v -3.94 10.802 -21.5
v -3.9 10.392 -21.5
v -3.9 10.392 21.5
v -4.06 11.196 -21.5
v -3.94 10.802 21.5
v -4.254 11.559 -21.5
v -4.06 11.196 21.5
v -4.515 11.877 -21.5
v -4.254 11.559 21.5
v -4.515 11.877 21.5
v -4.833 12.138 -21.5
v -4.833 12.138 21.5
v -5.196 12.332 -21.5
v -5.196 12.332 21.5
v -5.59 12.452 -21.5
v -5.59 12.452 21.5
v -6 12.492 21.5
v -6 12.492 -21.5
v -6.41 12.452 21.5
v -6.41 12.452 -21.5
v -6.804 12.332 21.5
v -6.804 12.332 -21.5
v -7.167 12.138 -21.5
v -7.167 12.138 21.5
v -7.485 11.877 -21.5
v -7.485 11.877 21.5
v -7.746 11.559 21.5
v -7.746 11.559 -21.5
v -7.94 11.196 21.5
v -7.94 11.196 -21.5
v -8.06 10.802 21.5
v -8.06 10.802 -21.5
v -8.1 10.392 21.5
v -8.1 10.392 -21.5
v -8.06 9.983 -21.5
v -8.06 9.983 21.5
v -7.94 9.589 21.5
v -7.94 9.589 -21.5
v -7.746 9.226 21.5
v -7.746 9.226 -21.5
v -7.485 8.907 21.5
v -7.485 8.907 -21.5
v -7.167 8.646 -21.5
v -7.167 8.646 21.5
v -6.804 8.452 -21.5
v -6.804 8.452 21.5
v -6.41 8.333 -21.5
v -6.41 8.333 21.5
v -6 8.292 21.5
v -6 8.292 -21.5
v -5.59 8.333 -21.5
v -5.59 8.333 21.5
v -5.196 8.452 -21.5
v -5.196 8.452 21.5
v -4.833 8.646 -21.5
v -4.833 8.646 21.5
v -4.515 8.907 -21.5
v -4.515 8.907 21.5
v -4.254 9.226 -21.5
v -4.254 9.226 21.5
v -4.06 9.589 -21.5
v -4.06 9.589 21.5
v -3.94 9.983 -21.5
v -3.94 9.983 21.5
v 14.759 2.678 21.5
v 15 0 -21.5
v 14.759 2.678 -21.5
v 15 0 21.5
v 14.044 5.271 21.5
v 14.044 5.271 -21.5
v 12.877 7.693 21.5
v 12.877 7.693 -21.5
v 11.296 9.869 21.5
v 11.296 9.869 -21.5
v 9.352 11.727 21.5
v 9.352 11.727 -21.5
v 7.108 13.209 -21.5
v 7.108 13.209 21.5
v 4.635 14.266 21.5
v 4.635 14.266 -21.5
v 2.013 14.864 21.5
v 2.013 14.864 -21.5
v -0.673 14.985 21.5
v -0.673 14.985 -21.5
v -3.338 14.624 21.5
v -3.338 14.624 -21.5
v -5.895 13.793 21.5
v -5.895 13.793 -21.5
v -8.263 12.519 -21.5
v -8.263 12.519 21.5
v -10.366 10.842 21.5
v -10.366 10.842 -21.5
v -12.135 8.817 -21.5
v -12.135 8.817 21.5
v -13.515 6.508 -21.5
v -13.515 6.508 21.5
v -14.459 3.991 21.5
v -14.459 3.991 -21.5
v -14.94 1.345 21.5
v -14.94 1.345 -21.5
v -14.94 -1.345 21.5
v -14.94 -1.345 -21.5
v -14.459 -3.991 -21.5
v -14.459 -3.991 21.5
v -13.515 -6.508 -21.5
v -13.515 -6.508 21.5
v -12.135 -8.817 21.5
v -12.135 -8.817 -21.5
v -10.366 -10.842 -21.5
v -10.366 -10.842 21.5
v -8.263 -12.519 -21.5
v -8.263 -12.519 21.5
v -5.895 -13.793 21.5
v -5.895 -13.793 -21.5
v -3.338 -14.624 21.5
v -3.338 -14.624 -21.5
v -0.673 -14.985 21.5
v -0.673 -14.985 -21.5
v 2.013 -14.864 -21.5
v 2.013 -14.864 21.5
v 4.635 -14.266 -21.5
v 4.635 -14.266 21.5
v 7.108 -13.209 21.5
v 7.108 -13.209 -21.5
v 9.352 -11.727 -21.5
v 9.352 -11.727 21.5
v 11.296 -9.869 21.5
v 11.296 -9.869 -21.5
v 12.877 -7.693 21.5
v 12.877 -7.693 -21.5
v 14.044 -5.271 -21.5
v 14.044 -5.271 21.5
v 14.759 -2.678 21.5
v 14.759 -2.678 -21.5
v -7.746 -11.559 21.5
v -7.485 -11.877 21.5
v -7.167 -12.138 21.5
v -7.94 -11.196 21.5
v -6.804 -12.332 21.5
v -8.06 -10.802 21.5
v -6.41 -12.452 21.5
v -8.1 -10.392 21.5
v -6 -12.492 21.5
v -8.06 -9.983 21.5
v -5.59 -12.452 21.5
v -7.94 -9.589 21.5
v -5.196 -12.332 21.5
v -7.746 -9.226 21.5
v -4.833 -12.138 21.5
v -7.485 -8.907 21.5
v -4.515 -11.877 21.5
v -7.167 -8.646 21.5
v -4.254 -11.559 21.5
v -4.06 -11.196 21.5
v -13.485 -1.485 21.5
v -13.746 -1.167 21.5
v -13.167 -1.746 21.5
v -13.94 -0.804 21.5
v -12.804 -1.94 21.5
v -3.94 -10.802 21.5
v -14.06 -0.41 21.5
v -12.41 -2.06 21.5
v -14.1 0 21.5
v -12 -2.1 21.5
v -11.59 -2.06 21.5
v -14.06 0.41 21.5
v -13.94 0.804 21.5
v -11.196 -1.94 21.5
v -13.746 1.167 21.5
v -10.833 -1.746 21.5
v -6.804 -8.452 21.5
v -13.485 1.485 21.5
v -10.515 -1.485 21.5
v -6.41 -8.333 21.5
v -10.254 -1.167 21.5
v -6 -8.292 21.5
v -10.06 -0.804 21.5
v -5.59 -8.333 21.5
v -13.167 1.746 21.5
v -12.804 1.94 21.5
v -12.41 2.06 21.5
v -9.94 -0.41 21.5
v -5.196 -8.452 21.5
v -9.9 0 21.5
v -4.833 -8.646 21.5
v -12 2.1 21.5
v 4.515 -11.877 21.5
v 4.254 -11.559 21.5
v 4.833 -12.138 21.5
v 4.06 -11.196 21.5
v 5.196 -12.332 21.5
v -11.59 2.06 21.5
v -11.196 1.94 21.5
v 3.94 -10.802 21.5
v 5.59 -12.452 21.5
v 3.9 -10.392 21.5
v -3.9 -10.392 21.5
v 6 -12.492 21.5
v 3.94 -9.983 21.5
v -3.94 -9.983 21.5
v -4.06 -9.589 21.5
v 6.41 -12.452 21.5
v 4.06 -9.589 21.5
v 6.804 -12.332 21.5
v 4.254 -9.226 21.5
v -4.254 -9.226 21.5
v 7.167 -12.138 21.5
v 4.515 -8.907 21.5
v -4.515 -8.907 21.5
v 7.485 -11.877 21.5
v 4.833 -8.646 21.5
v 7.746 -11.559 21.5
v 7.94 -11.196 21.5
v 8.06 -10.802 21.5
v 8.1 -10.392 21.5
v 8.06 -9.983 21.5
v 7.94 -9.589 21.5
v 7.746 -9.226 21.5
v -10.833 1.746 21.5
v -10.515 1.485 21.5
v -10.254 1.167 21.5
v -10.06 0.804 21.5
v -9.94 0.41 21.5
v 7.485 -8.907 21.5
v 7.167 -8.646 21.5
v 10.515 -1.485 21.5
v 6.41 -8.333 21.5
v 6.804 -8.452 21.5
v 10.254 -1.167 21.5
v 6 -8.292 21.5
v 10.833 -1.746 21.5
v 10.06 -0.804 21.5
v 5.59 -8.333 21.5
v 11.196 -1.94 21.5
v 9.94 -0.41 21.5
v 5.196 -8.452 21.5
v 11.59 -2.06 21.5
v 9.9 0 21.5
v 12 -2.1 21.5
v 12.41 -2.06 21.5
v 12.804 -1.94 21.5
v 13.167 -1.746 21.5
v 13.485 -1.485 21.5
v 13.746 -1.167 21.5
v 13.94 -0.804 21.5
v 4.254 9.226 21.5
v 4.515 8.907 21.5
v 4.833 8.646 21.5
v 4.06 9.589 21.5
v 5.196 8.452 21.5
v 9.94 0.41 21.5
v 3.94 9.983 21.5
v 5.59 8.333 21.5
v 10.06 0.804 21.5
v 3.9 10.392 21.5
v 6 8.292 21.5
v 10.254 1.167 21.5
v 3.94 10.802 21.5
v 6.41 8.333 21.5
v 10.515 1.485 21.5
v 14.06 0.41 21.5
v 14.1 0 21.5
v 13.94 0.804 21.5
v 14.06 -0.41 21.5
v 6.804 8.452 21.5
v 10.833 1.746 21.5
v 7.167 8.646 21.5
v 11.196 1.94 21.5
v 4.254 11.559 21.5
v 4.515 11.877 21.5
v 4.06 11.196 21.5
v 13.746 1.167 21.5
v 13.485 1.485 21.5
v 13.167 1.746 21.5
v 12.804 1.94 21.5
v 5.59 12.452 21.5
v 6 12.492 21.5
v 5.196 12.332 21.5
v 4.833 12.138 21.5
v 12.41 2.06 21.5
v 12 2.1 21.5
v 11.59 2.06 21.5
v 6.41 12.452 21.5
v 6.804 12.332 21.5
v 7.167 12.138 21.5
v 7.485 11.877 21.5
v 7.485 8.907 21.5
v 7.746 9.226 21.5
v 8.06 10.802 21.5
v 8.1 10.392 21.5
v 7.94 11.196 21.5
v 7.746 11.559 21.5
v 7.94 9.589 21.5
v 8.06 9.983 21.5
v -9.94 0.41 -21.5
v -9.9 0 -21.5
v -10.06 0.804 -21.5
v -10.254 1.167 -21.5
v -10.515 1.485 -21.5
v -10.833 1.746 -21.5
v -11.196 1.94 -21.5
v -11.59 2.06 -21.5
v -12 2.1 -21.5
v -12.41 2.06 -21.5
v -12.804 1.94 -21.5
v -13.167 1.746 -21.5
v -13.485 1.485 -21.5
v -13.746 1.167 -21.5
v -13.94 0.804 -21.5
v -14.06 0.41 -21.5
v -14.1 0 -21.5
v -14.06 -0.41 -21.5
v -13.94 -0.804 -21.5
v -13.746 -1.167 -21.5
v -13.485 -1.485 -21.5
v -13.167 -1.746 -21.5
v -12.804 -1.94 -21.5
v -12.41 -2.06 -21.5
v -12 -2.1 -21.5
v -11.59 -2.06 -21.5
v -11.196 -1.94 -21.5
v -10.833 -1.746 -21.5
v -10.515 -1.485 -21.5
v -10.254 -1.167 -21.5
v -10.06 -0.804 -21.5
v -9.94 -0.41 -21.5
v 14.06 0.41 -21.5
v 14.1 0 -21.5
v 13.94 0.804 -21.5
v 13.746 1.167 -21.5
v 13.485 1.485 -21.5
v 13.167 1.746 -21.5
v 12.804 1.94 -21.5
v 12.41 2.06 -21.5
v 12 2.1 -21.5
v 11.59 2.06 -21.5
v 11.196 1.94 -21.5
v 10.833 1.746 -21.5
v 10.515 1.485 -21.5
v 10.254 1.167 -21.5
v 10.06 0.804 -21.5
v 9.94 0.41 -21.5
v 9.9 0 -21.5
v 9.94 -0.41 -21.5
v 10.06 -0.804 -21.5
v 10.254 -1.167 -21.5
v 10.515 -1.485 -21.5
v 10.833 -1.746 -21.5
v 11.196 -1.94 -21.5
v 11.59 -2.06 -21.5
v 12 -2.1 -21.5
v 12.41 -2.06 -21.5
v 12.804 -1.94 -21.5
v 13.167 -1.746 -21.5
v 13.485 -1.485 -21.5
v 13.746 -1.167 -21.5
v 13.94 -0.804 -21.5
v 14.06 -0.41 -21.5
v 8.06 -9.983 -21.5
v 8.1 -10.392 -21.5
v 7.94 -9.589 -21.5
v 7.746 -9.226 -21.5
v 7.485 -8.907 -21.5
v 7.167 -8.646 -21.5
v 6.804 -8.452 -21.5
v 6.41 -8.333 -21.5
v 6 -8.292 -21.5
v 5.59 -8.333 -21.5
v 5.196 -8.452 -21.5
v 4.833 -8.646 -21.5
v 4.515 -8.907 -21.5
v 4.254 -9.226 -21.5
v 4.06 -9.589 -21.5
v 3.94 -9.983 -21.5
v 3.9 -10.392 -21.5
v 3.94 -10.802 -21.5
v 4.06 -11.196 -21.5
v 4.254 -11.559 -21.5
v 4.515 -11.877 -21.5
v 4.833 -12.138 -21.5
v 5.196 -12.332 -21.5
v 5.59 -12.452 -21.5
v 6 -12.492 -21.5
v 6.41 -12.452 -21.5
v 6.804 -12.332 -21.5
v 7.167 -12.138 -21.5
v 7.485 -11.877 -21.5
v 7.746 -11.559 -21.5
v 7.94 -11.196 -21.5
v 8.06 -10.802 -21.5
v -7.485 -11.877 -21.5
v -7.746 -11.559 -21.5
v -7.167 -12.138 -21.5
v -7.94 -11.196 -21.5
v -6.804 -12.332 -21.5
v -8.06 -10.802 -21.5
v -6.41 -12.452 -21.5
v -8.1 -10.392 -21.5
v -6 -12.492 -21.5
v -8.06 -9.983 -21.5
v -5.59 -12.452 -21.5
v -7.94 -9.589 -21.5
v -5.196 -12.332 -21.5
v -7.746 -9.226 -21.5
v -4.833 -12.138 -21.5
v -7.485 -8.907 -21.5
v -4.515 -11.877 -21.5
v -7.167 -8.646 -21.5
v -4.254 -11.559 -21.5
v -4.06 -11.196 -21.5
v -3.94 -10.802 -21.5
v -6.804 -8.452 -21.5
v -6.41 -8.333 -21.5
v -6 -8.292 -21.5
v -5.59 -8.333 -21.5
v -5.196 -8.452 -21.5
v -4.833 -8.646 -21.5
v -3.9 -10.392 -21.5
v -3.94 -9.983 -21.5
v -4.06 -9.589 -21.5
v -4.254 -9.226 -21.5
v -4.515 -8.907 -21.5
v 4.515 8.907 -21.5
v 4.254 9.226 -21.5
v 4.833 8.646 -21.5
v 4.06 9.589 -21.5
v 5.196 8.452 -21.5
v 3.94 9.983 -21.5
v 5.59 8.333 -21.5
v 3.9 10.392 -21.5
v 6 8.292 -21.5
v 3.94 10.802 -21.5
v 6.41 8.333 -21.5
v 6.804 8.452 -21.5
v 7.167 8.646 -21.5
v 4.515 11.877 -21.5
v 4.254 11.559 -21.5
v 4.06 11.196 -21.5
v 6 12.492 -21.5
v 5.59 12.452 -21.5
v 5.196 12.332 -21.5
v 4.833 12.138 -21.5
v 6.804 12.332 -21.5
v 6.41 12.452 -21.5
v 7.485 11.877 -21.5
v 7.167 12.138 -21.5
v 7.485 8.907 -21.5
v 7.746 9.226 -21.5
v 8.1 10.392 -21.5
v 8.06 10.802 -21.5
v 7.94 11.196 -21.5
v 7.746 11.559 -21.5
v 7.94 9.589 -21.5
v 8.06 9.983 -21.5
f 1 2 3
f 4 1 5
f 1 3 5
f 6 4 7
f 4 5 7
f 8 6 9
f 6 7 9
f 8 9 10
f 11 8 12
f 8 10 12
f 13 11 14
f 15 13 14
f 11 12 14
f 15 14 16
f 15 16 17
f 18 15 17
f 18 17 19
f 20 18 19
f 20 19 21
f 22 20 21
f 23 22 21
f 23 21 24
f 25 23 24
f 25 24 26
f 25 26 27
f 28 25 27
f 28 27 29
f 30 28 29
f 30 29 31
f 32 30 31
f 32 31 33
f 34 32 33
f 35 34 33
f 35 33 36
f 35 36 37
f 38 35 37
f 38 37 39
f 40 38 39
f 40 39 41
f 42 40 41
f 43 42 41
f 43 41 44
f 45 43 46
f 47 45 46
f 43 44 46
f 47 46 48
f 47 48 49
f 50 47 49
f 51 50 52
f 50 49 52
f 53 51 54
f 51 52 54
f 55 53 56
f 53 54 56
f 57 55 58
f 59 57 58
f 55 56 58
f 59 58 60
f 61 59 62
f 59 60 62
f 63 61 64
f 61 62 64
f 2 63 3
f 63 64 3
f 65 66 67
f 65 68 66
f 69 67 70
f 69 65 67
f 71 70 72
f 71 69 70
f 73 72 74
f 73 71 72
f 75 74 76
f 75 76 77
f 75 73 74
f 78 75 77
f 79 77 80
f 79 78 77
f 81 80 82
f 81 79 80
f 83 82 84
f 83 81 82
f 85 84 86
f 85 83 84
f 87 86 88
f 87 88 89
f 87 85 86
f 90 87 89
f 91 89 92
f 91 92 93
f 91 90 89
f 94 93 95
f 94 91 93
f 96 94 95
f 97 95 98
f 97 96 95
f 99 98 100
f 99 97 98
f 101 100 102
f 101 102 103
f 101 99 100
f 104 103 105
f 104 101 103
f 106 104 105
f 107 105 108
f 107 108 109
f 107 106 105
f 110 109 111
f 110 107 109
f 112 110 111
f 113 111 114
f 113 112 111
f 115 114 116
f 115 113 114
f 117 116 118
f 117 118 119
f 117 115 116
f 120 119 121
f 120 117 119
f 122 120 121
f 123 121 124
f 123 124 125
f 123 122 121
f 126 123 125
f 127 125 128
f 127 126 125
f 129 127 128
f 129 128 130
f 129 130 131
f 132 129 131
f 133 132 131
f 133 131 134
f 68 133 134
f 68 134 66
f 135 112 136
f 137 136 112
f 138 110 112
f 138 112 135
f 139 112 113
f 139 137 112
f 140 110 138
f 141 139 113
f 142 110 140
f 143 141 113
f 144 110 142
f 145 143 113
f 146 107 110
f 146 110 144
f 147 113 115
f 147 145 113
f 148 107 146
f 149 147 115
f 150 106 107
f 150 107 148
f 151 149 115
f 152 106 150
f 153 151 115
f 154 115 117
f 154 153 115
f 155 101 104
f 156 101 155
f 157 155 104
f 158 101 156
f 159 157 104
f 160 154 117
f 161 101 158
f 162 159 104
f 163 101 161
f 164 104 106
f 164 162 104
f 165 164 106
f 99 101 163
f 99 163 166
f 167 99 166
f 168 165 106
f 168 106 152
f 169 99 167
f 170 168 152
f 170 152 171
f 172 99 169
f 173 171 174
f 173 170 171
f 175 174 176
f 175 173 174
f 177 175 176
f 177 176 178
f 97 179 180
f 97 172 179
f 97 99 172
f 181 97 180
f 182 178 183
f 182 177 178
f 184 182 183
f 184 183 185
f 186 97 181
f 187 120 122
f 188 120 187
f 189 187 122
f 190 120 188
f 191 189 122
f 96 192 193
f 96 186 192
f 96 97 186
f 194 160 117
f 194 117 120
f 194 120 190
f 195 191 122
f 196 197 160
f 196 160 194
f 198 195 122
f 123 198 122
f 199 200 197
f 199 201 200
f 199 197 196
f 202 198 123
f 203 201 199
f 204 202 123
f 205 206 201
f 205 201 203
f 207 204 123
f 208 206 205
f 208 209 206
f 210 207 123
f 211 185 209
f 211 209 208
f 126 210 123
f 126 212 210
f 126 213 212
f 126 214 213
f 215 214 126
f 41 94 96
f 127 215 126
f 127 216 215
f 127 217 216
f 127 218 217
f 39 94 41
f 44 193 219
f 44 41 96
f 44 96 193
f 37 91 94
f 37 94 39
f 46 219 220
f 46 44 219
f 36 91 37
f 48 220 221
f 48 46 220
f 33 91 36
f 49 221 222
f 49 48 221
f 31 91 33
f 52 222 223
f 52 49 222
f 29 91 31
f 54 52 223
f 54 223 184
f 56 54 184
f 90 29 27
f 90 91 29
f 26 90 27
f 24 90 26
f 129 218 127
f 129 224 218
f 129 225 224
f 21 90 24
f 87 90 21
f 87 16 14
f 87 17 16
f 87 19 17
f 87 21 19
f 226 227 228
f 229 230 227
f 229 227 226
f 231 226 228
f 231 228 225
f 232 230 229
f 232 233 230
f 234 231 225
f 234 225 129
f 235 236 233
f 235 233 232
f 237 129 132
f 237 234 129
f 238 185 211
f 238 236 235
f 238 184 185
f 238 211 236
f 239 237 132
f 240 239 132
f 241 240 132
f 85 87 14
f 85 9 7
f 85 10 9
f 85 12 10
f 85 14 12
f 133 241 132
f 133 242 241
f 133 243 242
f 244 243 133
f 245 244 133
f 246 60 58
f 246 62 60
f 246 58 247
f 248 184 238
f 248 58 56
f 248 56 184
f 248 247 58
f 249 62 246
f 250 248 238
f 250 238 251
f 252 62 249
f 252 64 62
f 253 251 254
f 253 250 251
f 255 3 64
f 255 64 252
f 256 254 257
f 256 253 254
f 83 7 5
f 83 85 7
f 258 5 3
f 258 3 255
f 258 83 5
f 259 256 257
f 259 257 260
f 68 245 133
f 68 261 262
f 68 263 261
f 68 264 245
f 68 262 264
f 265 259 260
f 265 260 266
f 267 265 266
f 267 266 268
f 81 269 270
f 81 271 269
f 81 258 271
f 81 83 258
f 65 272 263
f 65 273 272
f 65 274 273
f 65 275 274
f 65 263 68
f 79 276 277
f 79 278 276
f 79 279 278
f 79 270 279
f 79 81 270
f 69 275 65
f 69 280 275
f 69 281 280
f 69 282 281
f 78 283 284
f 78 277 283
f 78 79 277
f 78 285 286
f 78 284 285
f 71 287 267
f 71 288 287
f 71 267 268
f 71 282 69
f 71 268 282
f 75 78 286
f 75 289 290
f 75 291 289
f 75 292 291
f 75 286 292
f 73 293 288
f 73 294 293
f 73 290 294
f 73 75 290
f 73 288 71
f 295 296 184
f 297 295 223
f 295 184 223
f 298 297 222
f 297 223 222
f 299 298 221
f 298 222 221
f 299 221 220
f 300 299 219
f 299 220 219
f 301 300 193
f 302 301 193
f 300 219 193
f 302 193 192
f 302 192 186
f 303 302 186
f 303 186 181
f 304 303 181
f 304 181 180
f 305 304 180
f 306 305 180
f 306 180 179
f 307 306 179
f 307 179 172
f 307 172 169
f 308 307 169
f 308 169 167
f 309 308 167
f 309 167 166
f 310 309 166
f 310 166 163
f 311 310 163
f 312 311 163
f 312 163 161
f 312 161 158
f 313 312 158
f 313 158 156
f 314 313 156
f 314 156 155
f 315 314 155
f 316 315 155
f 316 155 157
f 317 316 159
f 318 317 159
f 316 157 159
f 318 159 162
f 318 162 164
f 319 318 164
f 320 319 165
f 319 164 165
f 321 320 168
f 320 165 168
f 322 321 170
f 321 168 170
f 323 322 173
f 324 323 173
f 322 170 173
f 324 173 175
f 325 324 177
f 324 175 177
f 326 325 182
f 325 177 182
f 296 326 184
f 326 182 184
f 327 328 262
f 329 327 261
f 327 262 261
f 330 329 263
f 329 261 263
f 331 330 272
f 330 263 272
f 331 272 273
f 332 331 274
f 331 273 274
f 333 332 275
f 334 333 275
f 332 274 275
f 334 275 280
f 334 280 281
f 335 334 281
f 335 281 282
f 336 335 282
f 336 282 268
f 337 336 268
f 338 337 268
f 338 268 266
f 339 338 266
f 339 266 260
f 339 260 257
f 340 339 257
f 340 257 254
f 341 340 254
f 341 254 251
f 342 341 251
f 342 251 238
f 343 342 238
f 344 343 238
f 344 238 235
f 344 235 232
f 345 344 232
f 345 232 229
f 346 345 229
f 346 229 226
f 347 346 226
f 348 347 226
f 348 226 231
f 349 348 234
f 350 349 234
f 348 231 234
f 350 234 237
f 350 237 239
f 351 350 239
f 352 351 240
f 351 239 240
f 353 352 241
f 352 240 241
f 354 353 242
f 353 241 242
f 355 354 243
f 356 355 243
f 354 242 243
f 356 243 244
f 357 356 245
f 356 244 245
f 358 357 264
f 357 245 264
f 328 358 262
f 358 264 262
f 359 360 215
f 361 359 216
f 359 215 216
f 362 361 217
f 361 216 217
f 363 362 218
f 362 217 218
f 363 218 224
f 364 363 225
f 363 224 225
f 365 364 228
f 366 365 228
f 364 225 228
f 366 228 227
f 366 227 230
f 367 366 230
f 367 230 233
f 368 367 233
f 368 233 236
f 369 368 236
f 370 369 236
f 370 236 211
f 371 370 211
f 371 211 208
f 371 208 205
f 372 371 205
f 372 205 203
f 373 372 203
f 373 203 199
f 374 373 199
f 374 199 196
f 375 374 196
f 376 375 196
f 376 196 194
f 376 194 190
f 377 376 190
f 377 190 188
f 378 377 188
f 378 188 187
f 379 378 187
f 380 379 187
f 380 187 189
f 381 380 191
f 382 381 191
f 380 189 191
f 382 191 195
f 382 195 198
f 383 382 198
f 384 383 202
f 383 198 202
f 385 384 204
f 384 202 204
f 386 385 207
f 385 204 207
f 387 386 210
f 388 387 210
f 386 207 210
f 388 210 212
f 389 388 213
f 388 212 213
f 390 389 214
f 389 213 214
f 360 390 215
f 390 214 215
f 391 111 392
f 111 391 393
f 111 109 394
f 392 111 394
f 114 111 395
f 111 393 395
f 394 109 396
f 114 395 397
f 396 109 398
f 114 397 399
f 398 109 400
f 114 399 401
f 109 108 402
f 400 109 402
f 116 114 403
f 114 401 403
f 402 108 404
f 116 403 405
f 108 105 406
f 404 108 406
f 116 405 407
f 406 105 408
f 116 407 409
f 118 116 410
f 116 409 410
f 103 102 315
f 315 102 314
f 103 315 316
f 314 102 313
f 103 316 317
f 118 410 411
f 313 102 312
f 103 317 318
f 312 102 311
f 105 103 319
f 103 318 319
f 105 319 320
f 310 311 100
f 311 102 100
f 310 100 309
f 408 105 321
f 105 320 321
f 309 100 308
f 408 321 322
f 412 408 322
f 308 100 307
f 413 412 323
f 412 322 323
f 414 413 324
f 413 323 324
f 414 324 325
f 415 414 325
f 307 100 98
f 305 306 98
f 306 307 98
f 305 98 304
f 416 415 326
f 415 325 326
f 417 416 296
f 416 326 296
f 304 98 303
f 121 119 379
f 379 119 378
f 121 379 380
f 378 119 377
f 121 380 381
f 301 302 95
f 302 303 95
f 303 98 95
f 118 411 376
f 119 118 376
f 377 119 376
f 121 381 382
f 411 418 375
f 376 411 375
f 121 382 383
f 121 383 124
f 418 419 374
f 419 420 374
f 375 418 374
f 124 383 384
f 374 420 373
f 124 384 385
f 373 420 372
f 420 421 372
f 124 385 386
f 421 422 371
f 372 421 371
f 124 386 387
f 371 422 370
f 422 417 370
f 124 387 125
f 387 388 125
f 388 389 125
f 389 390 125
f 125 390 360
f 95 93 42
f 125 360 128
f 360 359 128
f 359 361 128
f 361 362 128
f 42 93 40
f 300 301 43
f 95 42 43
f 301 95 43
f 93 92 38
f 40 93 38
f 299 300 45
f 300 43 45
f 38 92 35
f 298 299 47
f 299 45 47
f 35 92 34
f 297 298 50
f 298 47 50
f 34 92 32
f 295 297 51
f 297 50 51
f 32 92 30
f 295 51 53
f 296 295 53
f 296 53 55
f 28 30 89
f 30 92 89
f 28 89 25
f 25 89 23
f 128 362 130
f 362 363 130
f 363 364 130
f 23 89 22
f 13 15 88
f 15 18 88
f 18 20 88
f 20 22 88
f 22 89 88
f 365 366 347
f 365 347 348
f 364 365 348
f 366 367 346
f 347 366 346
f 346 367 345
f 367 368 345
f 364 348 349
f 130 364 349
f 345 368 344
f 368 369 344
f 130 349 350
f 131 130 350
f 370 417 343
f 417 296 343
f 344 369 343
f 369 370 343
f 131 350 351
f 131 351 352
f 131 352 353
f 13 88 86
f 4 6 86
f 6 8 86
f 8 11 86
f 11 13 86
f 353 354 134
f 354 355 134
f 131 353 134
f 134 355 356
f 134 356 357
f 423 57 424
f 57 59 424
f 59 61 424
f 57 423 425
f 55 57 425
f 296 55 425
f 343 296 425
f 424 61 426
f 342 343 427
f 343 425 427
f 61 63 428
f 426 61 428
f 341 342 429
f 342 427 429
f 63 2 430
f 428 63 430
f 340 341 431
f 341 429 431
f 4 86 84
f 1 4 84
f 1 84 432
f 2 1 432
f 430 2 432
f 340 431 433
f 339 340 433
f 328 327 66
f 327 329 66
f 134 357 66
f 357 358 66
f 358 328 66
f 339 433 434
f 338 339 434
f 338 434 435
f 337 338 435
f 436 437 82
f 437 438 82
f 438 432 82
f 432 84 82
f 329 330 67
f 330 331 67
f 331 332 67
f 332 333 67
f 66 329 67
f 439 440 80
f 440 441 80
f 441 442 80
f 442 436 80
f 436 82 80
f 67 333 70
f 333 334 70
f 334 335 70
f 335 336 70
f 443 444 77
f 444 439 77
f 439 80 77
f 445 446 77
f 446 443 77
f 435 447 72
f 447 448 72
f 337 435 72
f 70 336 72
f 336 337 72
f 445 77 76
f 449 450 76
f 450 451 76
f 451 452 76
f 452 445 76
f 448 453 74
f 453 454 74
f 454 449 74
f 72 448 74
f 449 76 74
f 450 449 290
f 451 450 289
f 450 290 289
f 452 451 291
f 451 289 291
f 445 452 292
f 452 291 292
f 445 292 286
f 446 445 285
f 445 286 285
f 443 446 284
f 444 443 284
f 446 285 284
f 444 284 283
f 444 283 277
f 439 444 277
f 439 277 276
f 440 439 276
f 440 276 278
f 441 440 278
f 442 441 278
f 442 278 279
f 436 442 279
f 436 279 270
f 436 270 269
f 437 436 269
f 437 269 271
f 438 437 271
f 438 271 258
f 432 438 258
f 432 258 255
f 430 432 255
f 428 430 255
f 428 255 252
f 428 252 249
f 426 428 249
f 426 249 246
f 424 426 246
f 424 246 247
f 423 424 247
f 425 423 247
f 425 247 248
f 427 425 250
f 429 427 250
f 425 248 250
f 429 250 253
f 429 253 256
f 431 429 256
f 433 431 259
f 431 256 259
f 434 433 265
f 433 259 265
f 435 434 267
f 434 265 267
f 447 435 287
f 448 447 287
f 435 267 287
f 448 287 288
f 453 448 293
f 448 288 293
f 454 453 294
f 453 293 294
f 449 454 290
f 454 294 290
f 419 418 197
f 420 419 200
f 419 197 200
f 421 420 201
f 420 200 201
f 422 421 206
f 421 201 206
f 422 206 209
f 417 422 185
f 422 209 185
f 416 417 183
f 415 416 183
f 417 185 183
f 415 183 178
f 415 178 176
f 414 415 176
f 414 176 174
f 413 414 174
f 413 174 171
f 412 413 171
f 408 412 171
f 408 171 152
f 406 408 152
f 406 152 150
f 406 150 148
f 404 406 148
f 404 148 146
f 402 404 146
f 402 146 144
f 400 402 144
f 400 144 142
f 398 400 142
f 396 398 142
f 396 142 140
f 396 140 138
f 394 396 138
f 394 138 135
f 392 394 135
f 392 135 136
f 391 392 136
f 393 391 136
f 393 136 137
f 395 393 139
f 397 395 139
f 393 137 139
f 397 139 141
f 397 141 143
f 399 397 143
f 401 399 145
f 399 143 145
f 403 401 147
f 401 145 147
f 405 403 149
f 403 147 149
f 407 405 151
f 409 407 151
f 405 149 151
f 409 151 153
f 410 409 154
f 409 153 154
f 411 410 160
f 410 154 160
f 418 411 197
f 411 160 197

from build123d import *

# Parameters (mm, degrees)
SKETCH1_R           = 15
BOSS_EXTRUDE1_DEPTH = 21.5
SKETCH2_R           = 2.1
CUT_EXTRUDE1_DEPTH  = 48.947888379


with BuildPart() as part:
    # Sketch1 → Boss-Extrude1 (new, symmetric)
    with BuildSketch(Plane.XY):
        Circle(SKETCH1_R)
    extrude(amount=BOSS_EXTRUDE1_DEPTH, both=True)

    # Sketch2 → Cut-Extrude1 (cut, through all)
    with BuildSketch(Plane.XY.offset(21.5)):
        with Locations((-12, 0)):
            Circle(SKETCH2_R)
        with Locations((-6, 10.392304845)):
            Circle(SKETCH2_R)
        with Locations((6, 10.392304845)):
            Circle(SKETCH2_R)
        with Locations((12, 0)):
            Circle(SKETCH2_R)
        with Locations((6, -10.392304845)):
            Circle(SKETCH2_R)
        with Locations((-6, -10.392304845)):
            Circle(SKETCH2_R)
    extrude(amount=-CUT_EXTRUDE1_DEPTH, mode=Mode.SUBTRACT)


solid = part.part
